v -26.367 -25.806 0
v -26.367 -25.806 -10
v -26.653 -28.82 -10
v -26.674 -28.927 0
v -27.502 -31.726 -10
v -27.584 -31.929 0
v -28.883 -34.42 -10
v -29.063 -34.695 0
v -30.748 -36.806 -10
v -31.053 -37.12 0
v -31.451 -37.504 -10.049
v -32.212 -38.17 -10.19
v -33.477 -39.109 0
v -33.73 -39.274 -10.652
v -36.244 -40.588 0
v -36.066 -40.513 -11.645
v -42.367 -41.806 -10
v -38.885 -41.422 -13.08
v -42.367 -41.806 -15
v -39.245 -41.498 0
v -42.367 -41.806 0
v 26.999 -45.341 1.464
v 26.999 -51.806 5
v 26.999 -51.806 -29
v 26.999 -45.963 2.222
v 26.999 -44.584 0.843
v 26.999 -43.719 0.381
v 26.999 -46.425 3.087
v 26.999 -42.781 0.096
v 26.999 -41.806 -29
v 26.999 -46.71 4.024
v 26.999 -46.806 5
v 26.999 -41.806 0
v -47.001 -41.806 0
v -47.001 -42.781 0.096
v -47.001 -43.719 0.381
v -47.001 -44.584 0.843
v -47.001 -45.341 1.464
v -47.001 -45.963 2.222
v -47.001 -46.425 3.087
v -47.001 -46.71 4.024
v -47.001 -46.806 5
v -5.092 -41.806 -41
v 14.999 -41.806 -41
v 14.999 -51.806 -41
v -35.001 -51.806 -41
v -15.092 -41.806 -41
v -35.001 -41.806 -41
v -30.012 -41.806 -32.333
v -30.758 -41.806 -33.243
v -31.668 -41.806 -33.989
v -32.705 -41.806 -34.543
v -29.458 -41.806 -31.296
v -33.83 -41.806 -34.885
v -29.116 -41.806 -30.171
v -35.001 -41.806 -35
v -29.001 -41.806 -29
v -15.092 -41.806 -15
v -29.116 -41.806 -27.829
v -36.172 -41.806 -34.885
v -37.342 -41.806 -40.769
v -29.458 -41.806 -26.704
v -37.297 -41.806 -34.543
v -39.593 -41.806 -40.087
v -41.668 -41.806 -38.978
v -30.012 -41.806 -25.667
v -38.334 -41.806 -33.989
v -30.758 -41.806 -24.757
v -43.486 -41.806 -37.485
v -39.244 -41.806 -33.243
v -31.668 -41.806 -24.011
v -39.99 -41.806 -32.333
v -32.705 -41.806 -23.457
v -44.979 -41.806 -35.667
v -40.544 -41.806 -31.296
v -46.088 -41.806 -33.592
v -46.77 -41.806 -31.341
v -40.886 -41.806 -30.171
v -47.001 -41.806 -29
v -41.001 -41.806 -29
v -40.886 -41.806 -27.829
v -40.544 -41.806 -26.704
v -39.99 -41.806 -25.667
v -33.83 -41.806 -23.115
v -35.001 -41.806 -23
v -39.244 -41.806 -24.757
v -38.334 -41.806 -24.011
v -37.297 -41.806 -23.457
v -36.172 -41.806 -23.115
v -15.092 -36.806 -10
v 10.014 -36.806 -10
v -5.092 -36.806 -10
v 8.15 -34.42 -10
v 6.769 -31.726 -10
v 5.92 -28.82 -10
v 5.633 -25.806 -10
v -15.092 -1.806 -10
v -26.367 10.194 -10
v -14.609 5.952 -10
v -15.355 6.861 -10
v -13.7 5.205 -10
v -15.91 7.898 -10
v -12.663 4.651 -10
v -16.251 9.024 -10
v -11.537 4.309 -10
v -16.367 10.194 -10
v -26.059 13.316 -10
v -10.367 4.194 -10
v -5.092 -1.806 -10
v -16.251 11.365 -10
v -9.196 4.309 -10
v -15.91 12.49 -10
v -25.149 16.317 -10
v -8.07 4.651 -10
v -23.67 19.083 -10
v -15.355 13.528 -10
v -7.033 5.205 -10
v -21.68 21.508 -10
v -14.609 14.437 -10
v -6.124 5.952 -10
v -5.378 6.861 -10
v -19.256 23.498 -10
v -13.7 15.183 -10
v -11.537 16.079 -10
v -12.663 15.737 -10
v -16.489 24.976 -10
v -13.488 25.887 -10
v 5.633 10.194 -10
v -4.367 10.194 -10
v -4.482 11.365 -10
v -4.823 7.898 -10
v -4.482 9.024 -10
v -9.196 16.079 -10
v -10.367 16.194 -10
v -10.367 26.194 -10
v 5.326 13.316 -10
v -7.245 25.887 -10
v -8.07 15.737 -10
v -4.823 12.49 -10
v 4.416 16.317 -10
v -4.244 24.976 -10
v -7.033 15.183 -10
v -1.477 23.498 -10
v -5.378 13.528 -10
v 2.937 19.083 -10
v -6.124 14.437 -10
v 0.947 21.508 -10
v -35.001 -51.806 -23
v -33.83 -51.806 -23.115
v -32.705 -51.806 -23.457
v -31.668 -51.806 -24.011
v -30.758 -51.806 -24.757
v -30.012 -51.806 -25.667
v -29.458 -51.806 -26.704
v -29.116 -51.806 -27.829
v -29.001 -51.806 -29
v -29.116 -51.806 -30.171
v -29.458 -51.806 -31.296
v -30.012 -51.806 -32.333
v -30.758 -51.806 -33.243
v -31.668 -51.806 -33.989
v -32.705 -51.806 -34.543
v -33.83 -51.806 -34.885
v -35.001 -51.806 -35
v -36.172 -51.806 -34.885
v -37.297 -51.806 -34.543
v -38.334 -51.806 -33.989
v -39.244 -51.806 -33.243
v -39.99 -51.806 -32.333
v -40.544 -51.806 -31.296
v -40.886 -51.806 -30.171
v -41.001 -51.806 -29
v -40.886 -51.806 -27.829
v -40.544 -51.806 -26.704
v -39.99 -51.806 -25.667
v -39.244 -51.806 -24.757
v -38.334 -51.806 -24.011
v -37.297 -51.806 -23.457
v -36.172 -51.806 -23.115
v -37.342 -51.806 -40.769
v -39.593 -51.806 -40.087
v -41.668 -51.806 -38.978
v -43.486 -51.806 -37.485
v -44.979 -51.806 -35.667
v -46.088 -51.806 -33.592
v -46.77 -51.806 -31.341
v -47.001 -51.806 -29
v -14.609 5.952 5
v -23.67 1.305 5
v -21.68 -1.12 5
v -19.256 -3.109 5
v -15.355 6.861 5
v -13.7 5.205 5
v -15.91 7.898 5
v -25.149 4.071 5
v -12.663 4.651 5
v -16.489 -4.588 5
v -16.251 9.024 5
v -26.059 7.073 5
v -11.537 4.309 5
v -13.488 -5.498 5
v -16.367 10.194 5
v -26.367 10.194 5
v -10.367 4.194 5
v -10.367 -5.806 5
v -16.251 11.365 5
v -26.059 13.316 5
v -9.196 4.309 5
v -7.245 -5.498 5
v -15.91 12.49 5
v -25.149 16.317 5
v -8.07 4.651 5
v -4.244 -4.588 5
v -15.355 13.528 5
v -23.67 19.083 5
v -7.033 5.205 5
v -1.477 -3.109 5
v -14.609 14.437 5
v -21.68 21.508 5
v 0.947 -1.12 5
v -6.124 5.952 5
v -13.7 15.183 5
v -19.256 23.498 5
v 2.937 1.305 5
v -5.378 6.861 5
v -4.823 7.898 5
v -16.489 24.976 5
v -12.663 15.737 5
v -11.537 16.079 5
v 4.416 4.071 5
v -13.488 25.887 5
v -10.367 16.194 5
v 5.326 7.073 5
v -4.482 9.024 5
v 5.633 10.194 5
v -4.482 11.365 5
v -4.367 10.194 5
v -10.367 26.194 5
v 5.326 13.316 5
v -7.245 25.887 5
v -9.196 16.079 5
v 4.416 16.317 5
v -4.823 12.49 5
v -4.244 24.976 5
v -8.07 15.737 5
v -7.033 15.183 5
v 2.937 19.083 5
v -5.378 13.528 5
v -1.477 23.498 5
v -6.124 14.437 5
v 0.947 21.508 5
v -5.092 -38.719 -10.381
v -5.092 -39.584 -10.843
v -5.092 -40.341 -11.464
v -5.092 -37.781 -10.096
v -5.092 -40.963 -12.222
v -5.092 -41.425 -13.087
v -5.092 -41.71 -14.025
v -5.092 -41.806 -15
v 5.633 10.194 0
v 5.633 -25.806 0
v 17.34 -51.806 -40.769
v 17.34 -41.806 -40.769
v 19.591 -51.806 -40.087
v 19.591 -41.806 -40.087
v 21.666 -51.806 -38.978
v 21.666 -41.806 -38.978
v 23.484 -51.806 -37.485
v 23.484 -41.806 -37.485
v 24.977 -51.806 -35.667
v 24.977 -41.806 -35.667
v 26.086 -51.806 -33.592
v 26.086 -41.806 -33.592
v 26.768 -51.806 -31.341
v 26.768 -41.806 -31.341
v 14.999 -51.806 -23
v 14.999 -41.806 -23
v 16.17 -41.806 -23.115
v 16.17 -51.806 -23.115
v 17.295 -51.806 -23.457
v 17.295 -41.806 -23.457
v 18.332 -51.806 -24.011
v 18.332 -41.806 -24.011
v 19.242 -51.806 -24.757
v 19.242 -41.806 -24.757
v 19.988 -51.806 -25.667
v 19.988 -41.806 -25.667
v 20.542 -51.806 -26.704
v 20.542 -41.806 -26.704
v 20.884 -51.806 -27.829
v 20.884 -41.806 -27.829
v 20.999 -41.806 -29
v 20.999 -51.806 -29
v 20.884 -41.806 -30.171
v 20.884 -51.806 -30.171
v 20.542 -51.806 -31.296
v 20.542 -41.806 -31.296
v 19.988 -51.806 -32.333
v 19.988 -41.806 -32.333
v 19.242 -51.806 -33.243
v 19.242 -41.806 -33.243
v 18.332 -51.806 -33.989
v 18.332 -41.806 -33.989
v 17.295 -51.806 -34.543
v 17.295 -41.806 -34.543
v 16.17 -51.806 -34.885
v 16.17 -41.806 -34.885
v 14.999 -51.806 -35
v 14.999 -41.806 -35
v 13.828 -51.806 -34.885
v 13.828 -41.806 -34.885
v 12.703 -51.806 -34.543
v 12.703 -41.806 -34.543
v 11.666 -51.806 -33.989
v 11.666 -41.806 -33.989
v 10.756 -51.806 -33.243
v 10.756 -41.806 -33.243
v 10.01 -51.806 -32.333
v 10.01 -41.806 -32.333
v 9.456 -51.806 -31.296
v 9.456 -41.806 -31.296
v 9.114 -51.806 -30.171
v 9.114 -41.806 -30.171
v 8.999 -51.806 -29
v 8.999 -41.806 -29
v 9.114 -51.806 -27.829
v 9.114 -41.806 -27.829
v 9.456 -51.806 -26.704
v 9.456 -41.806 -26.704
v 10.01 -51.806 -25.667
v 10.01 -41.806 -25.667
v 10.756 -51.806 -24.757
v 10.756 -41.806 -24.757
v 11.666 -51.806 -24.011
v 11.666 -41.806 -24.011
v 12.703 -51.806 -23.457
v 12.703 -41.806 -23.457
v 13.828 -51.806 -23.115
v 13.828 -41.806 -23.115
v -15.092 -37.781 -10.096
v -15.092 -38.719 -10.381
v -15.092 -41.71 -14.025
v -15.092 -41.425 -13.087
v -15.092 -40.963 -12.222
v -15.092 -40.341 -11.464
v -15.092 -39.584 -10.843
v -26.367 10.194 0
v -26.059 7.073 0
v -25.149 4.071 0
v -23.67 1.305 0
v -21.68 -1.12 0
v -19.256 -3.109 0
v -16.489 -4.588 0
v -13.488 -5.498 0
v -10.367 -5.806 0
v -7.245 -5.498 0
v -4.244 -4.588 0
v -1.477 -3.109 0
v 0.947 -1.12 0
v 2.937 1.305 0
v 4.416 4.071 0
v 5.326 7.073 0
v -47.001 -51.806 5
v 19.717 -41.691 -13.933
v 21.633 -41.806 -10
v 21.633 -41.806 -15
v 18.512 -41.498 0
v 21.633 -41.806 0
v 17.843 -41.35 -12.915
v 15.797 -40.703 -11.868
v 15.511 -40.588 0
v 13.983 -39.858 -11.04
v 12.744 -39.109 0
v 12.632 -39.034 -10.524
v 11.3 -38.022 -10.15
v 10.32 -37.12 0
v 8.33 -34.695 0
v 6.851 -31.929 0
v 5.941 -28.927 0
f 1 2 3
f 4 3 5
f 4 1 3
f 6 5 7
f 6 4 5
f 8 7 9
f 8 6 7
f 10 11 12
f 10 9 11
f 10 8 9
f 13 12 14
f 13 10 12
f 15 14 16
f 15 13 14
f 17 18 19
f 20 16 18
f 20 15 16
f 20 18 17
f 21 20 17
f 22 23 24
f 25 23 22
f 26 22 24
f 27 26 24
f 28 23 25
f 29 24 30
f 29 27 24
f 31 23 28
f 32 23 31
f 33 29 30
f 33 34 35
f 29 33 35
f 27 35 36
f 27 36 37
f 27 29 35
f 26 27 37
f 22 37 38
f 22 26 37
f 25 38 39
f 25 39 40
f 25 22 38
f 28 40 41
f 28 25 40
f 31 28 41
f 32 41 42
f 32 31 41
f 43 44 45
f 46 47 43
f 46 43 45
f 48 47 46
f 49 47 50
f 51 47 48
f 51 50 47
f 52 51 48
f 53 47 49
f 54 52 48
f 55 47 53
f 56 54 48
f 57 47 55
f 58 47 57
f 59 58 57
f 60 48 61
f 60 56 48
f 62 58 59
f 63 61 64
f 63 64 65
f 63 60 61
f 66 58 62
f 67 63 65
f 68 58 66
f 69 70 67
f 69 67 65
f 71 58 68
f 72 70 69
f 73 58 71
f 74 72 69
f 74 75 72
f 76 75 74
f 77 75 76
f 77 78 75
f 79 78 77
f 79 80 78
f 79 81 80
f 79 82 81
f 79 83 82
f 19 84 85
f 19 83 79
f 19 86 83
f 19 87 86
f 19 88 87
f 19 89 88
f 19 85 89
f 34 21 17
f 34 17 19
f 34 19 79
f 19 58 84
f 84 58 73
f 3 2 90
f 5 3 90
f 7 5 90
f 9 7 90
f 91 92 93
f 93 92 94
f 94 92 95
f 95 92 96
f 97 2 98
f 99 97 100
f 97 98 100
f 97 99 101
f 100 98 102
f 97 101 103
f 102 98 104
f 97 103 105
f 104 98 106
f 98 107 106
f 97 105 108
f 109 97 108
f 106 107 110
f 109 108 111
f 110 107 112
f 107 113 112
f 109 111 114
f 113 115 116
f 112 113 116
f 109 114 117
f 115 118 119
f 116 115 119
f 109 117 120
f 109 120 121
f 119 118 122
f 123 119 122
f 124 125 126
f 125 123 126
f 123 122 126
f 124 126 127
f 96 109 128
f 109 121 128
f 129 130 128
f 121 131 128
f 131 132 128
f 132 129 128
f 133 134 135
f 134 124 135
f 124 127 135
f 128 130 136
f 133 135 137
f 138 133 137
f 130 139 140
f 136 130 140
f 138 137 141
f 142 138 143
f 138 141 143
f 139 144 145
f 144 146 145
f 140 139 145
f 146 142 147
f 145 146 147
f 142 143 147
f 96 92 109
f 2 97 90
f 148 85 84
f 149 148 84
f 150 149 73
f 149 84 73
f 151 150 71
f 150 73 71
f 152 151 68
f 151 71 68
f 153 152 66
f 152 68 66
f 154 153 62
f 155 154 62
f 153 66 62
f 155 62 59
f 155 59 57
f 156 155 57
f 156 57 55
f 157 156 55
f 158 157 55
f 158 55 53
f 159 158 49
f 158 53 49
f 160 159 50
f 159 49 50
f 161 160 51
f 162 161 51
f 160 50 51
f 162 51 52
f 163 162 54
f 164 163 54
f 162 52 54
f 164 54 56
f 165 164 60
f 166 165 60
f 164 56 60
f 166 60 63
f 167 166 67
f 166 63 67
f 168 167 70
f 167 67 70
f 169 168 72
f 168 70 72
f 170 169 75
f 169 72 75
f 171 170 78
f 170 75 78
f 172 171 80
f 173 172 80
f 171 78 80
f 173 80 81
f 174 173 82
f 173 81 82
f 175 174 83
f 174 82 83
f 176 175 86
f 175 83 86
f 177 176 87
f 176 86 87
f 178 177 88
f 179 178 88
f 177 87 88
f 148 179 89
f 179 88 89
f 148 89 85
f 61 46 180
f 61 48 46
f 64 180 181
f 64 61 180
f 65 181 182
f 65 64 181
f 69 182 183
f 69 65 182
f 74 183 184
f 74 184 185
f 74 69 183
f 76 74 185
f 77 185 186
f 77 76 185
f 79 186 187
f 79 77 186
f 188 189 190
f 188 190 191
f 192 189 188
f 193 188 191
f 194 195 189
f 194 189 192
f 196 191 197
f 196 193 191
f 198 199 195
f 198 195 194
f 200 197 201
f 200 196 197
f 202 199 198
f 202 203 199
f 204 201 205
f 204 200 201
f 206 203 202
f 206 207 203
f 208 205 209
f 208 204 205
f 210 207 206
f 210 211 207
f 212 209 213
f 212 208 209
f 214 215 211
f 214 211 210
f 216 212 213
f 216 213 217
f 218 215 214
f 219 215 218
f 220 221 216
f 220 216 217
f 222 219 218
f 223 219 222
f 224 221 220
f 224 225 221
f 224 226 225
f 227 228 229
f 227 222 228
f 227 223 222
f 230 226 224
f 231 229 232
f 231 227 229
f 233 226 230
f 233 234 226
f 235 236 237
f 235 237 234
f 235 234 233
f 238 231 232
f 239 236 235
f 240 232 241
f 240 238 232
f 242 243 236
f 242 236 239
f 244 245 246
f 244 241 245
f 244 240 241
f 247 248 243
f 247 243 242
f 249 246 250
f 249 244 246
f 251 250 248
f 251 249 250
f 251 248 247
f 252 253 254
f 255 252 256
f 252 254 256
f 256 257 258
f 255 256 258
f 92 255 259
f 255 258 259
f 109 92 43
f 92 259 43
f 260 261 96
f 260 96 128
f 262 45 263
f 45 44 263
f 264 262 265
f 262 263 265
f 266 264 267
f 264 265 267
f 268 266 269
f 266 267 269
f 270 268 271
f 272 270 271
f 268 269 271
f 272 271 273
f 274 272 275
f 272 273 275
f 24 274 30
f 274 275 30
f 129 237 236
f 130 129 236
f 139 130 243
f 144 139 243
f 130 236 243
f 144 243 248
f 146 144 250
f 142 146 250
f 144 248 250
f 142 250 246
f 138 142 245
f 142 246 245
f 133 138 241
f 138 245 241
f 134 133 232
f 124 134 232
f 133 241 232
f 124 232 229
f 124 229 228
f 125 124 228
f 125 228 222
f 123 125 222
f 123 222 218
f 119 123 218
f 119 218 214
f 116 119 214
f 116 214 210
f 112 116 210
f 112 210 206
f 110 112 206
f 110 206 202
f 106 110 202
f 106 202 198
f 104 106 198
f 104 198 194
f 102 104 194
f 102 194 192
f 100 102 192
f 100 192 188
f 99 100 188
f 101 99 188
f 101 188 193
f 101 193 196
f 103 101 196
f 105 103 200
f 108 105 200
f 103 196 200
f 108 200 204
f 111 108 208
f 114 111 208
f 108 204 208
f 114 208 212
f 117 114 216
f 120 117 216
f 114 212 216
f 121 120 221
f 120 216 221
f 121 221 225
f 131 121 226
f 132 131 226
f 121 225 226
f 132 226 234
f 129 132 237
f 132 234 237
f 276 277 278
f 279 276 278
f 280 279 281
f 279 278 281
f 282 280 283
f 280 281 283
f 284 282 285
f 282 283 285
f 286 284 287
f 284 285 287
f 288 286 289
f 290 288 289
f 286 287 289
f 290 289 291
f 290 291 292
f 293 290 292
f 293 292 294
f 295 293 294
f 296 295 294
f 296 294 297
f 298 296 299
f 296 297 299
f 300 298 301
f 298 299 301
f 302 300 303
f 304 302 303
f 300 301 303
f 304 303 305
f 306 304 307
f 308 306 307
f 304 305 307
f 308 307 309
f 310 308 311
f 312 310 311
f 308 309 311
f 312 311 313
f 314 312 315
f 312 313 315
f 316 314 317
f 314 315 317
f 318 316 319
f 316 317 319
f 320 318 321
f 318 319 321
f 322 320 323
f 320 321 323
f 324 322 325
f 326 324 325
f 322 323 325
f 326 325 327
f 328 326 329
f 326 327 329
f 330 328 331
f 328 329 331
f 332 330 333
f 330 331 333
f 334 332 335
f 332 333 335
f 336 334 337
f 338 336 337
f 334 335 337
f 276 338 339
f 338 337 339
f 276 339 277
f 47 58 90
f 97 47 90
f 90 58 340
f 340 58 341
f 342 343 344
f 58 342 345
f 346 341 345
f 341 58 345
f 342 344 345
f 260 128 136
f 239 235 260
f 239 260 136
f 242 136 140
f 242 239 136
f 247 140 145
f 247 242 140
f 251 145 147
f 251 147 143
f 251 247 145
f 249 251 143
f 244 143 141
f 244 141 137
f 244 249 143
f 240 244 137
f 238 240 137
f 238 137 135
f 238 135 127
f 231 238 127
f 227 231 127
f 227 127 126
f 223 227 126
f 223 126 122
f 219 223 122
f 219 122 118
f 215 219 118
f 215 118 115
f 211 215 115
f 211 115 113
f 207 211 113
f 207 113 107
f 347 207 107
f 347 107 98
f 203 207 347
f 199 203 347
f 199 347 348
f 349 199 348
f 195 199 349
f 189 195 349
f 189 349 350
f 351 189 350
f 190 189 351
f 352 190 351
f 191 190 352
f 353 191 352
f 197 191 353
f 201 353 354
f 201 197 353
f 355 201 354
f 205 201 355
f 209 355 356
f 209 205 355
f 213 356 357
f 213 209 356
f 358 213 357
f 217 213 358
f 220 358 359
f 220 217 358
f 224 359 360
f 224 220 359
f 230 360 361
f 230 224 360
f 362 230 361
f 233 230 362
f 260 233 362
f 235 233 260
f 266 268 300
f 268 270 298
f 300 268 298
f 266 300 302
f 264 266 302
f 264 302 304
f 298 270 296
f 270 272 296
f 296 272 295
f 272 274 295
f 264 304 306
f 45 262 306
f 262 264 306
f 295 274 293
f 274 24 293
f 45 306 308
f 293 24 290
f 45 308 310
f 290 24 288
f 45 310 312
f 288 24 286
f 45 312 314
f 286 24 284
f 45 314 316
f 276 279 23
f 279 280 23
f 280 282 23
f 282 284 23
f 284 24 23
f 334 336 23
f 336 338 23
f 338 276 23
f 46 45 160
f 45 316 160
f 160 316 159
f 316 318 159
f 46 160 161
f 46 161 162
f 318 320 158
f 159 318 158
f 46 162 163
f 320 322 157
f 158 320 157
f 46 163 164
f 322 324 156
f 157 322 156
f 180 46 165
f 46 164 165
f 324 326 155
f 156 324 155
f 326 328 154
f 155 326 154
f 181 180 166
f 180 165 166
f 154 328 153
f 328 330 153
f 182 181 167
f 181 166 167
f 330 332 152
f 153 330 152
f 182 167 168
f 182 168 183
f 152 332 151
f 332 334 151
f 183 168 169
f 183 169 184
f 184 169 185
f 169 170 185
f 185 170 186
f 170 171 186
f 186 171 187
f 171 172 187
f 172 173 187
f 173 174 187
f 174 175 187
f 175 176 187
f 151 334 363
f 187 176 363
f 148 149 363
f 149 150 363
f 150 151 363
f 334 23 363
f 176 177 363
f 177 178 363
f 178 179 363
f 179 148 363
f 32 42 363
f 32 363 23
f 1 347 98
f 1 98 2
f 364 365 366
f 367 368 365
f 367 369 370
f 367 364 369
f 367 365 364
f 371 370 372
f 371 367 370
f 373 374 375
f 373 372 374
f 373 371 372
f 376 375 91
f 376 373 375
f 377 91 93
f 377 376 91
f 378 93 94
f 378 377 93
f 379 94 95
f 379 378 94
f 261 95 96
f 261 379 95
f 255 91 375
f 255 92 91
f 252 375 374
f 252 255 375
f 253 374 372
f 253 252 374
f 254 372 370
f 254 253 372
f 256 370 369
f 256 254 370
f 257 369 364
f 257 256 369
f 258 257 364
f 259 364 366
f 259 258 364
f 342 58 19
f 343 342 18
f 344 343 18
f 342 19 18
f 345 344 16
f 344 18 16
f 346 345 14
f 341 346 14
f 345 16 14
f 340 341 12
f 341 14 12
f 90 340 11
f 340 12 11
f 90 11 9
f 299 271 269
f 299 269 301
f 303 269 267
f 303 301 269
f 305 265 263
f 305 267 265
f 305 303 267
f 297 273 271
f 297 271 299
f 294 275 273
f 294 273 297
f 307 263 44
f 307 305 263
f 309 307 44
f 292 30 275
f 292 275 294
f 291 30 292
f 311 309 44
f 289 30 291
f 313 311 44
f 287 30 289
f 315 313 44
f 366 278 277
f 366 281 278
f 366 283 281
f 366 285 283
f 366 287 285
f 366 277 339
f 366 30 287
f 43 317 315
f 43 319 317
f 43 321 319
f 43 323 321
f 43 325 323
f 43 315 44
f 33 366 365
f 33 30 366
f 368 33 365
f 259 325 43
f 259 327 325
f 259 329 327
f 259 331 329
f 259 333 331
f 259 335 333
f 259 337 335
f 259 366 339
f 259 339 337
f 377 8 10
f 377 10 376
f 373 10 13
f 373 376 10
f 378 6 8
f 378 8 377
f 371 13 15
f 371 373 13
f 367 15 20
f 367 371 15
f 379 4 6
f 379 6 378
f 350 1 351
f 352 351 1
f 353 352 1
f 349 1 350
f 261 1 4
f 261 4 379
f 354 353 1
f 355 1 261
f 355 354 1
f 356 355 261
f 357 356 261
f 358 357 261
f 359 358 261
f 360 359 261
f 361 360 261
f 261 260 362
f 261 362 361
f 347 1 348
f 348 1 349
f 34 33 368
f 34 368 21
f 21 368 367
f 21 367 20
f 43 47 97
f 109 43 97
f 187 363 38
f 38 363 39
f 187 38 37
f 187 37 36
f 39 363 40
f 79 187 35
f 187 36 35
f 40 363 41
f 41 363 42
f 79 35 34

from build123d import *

# Parameters (mm, degrees)
SKETCH1_R            = 6
BOSS_EXTRUDE1_DEPTH  = 10
BOSS_EXTRUDE3_START  = 5
SKETCH2_R            = 16
SKETCH2_R_2          = 6
BOSS_EXTRUDE3_DEPTH  = 5
SKETCH3_W            = 74
SKETCH3_H            = 5
BOSS_EXTRUDE5_DEPTH  = 5
FILLET4_R            = 5
SKETCH5_W            = 74
SKETCH5_H            = 10
BOSS_EXTRUDE8_DEPTH  = 31
BOSS_EXTRUDE10_DEPTH = 40
CUT_EXTRUDE1_DEPTH   = 10
FILLET5_R            = 5
FILLET6_R            = 5
FILLET7_R            = 12
FILLET8_R            = 12
SKETCH16_R           = 6
CUT_EXTRUDE2_DEPTH   = 10
SKETCH17_R           = 6
CUT_EXTRUDE3_DEPTH   = 10


with BuildPart() as part:
    # Sketch1 → Boss-Extrude1 (new body)
    with BuildSketch(Plane.XY):
        with BuildLine():
            Line((-47.000970423, -51.805827164), (26.999029577, -51.805827164))
            Line((26.999029577, -51.805827164), (26.999029577, -41.805827164))
            Line((26.999029577, -41.805827164), (21.633436879, -41.805827164))
            ThreePointArc((21.633436879, -41.805827164), (10.31972838, -37.119535663), (5.633436879, -25.805827164))
            Line((5.633436879, -25.805827164), (5.633436879, 10.194172836))
            ThreePointArc((5.633436879, 10.194172836), (-10.366563121, 26.194172836), (-26.366563121, 10.194172836))
            Line((-26.366563121, 10.194172836), (-26.366563121, -25.805827164))
            ThreePointArc((-26.366563121, -25.805827164), (-31.052854622, -37.119535663), (-42.366563121, -41.805827164))
            Line((-42.366563121, -41.805827164), (-47.000970423, -41.805827164))
            Line((-47.000970423, -41.805827164), (-47.000970423, -51.805827164))
        make_face()
        with Locations((-10.366563121, 10.194172836)):
            Circle(SKETCH1_R, mode=Mode.SUBTRACT)
    extrude(amount=-BOSS_EXTRUDE1_DEPTH)

    # Sketch2 → Boss-Extrude3 (add)
    with BuildSketch(Plane.XY.offset(BOSS_EXTRUDE3_START)):
        with Locations((-10.366563121, 10.194172836)):
            Circle(SKETCH2_R)
        with Locations((-10.366563121, 10.194172836)):
            Circle(SKETCH2_R_2, mode=Mode.SUBTRACT)
    extrude(amount=-BOSS_EXTRUDE3_DEPTH)

    # Sketch3 → Boss-Extrude5 (add)
    with BuildSketch(Plane.XY):
        with Locations((-10.000970423, -49.305827164)):
            Rectangle(SKETCH3_W, SKETCH3_H)
    extrude(amount=BOSS_EXTRUDE5_DEPTH)

    # Fillet4
    fillet4_edges = [part.edges().sort_by_distance(p)[0] for p in [
        (-10.000970423, -46.805827164, 0),
    ]]
    fillet(fillet4_edges, radius=FILLET4_R - 0.0001)  # a hair under: the kernel refuses the full size

    # Sketch5 → Boss-Extrude8 (add)
    with BuildSketch(Plane(origin=(0, 0, -10), x_dir=(-1, 0, 0), z_dir=(0, 0, -1))):
        with Locations((10.000970423, -46.805827164)):
            Rectangle(SKETCH5_W, SKETCH5_H)
    extrude(amount=BOSS_EXTRUDE8_DEPTH)

    # Sketch13 → Boss-Extrude10 (add)
    with BuildSketch(Plane(origin=(0, -41.805827164, 0), x_dir=(1, 0, 0), z_dir=(0, 1, 0))):
        Polygon((-10.091769113, 41), (-15.091769113, 41), (-15.091769113, 10), (-5.091769113, 10), (-5.091769113, 41), align=None)
    extrude(amount=BOSS_EXTRUDE10_DEPTH)

    # Sketch14 → Cut-Extrude1 (cut)
    with BuildSketch(Plane.ZY.offset(15.091769113)):
        Polygon((-41, -41.805827164), (-10, -1.805827164), (-41, -1.805827164), align=None)
    extrude(amount=-CUT_EXTRUDE1_DEPTH, mode=Mode.SUBTRACT)

    # Fillet5
    fillet5_edges = [part.edges().sort_by_distance(p)[0] for p in [
        (-28.729166117, -41.805827164, -10),
    ]]
    fillet(fillet5_edges, radius=FILLET5_R)

    # Fillet6
    fillet6_edges = [part.edges().sort_by_distance(p)[0] for p in [
        (8.270833883, -41.805827164, -10),
    ]]
    fillet(fillet6_edges, radius=FILLET6_R)

    # Fillet7
    fillet7_edges = [part.edges().sort_by_distance(p)[0] for p in [
        (26.999029577, -46.805827164, -41),
    ]]
    fillet(fillet7_edges, radius=FILLET7_R)

    # Fillet8
    fillet8_edges = [part.edges().sort_by_distance(p)[0] for p in [
        (-47.000970423, -46.805827164, -41),
    ]]
    fillet(fillet8_edges, radius=FILLET8_R)

    # Sketch16 → Cut-Extrude2 (cut)
    with BuildSketch(Plane(origin=(0, -41.805827164, 0), x_dir=(1, 0, 0), z_dir=(0, 1, 0))):
        with Locations(Location((14.999029577, 29, 0), (0, 0, 270))):
            Circle(SKETCH16_R)
    extrude(amount=-CUT_EXTRUDE2_DEPTH, mode=Mode.SUBTRACT)

    # Sketch17 → Cut-Extrude3 (cut)
    with BuildSketch(Plane(origin=(0, -41.805827164, 0), x_dir=(1, 0, 0), z_dir=(0, 1, 0))):
        with Locations(Location((-35.000970423, 29, 0), (0, 0, 270))):
            Circle(SKETCH17_R)
    extrude(amount=-CUT_EXTRUDE3_DEPTH, mode=Mode.SUBTRACT)


solid = part.part
